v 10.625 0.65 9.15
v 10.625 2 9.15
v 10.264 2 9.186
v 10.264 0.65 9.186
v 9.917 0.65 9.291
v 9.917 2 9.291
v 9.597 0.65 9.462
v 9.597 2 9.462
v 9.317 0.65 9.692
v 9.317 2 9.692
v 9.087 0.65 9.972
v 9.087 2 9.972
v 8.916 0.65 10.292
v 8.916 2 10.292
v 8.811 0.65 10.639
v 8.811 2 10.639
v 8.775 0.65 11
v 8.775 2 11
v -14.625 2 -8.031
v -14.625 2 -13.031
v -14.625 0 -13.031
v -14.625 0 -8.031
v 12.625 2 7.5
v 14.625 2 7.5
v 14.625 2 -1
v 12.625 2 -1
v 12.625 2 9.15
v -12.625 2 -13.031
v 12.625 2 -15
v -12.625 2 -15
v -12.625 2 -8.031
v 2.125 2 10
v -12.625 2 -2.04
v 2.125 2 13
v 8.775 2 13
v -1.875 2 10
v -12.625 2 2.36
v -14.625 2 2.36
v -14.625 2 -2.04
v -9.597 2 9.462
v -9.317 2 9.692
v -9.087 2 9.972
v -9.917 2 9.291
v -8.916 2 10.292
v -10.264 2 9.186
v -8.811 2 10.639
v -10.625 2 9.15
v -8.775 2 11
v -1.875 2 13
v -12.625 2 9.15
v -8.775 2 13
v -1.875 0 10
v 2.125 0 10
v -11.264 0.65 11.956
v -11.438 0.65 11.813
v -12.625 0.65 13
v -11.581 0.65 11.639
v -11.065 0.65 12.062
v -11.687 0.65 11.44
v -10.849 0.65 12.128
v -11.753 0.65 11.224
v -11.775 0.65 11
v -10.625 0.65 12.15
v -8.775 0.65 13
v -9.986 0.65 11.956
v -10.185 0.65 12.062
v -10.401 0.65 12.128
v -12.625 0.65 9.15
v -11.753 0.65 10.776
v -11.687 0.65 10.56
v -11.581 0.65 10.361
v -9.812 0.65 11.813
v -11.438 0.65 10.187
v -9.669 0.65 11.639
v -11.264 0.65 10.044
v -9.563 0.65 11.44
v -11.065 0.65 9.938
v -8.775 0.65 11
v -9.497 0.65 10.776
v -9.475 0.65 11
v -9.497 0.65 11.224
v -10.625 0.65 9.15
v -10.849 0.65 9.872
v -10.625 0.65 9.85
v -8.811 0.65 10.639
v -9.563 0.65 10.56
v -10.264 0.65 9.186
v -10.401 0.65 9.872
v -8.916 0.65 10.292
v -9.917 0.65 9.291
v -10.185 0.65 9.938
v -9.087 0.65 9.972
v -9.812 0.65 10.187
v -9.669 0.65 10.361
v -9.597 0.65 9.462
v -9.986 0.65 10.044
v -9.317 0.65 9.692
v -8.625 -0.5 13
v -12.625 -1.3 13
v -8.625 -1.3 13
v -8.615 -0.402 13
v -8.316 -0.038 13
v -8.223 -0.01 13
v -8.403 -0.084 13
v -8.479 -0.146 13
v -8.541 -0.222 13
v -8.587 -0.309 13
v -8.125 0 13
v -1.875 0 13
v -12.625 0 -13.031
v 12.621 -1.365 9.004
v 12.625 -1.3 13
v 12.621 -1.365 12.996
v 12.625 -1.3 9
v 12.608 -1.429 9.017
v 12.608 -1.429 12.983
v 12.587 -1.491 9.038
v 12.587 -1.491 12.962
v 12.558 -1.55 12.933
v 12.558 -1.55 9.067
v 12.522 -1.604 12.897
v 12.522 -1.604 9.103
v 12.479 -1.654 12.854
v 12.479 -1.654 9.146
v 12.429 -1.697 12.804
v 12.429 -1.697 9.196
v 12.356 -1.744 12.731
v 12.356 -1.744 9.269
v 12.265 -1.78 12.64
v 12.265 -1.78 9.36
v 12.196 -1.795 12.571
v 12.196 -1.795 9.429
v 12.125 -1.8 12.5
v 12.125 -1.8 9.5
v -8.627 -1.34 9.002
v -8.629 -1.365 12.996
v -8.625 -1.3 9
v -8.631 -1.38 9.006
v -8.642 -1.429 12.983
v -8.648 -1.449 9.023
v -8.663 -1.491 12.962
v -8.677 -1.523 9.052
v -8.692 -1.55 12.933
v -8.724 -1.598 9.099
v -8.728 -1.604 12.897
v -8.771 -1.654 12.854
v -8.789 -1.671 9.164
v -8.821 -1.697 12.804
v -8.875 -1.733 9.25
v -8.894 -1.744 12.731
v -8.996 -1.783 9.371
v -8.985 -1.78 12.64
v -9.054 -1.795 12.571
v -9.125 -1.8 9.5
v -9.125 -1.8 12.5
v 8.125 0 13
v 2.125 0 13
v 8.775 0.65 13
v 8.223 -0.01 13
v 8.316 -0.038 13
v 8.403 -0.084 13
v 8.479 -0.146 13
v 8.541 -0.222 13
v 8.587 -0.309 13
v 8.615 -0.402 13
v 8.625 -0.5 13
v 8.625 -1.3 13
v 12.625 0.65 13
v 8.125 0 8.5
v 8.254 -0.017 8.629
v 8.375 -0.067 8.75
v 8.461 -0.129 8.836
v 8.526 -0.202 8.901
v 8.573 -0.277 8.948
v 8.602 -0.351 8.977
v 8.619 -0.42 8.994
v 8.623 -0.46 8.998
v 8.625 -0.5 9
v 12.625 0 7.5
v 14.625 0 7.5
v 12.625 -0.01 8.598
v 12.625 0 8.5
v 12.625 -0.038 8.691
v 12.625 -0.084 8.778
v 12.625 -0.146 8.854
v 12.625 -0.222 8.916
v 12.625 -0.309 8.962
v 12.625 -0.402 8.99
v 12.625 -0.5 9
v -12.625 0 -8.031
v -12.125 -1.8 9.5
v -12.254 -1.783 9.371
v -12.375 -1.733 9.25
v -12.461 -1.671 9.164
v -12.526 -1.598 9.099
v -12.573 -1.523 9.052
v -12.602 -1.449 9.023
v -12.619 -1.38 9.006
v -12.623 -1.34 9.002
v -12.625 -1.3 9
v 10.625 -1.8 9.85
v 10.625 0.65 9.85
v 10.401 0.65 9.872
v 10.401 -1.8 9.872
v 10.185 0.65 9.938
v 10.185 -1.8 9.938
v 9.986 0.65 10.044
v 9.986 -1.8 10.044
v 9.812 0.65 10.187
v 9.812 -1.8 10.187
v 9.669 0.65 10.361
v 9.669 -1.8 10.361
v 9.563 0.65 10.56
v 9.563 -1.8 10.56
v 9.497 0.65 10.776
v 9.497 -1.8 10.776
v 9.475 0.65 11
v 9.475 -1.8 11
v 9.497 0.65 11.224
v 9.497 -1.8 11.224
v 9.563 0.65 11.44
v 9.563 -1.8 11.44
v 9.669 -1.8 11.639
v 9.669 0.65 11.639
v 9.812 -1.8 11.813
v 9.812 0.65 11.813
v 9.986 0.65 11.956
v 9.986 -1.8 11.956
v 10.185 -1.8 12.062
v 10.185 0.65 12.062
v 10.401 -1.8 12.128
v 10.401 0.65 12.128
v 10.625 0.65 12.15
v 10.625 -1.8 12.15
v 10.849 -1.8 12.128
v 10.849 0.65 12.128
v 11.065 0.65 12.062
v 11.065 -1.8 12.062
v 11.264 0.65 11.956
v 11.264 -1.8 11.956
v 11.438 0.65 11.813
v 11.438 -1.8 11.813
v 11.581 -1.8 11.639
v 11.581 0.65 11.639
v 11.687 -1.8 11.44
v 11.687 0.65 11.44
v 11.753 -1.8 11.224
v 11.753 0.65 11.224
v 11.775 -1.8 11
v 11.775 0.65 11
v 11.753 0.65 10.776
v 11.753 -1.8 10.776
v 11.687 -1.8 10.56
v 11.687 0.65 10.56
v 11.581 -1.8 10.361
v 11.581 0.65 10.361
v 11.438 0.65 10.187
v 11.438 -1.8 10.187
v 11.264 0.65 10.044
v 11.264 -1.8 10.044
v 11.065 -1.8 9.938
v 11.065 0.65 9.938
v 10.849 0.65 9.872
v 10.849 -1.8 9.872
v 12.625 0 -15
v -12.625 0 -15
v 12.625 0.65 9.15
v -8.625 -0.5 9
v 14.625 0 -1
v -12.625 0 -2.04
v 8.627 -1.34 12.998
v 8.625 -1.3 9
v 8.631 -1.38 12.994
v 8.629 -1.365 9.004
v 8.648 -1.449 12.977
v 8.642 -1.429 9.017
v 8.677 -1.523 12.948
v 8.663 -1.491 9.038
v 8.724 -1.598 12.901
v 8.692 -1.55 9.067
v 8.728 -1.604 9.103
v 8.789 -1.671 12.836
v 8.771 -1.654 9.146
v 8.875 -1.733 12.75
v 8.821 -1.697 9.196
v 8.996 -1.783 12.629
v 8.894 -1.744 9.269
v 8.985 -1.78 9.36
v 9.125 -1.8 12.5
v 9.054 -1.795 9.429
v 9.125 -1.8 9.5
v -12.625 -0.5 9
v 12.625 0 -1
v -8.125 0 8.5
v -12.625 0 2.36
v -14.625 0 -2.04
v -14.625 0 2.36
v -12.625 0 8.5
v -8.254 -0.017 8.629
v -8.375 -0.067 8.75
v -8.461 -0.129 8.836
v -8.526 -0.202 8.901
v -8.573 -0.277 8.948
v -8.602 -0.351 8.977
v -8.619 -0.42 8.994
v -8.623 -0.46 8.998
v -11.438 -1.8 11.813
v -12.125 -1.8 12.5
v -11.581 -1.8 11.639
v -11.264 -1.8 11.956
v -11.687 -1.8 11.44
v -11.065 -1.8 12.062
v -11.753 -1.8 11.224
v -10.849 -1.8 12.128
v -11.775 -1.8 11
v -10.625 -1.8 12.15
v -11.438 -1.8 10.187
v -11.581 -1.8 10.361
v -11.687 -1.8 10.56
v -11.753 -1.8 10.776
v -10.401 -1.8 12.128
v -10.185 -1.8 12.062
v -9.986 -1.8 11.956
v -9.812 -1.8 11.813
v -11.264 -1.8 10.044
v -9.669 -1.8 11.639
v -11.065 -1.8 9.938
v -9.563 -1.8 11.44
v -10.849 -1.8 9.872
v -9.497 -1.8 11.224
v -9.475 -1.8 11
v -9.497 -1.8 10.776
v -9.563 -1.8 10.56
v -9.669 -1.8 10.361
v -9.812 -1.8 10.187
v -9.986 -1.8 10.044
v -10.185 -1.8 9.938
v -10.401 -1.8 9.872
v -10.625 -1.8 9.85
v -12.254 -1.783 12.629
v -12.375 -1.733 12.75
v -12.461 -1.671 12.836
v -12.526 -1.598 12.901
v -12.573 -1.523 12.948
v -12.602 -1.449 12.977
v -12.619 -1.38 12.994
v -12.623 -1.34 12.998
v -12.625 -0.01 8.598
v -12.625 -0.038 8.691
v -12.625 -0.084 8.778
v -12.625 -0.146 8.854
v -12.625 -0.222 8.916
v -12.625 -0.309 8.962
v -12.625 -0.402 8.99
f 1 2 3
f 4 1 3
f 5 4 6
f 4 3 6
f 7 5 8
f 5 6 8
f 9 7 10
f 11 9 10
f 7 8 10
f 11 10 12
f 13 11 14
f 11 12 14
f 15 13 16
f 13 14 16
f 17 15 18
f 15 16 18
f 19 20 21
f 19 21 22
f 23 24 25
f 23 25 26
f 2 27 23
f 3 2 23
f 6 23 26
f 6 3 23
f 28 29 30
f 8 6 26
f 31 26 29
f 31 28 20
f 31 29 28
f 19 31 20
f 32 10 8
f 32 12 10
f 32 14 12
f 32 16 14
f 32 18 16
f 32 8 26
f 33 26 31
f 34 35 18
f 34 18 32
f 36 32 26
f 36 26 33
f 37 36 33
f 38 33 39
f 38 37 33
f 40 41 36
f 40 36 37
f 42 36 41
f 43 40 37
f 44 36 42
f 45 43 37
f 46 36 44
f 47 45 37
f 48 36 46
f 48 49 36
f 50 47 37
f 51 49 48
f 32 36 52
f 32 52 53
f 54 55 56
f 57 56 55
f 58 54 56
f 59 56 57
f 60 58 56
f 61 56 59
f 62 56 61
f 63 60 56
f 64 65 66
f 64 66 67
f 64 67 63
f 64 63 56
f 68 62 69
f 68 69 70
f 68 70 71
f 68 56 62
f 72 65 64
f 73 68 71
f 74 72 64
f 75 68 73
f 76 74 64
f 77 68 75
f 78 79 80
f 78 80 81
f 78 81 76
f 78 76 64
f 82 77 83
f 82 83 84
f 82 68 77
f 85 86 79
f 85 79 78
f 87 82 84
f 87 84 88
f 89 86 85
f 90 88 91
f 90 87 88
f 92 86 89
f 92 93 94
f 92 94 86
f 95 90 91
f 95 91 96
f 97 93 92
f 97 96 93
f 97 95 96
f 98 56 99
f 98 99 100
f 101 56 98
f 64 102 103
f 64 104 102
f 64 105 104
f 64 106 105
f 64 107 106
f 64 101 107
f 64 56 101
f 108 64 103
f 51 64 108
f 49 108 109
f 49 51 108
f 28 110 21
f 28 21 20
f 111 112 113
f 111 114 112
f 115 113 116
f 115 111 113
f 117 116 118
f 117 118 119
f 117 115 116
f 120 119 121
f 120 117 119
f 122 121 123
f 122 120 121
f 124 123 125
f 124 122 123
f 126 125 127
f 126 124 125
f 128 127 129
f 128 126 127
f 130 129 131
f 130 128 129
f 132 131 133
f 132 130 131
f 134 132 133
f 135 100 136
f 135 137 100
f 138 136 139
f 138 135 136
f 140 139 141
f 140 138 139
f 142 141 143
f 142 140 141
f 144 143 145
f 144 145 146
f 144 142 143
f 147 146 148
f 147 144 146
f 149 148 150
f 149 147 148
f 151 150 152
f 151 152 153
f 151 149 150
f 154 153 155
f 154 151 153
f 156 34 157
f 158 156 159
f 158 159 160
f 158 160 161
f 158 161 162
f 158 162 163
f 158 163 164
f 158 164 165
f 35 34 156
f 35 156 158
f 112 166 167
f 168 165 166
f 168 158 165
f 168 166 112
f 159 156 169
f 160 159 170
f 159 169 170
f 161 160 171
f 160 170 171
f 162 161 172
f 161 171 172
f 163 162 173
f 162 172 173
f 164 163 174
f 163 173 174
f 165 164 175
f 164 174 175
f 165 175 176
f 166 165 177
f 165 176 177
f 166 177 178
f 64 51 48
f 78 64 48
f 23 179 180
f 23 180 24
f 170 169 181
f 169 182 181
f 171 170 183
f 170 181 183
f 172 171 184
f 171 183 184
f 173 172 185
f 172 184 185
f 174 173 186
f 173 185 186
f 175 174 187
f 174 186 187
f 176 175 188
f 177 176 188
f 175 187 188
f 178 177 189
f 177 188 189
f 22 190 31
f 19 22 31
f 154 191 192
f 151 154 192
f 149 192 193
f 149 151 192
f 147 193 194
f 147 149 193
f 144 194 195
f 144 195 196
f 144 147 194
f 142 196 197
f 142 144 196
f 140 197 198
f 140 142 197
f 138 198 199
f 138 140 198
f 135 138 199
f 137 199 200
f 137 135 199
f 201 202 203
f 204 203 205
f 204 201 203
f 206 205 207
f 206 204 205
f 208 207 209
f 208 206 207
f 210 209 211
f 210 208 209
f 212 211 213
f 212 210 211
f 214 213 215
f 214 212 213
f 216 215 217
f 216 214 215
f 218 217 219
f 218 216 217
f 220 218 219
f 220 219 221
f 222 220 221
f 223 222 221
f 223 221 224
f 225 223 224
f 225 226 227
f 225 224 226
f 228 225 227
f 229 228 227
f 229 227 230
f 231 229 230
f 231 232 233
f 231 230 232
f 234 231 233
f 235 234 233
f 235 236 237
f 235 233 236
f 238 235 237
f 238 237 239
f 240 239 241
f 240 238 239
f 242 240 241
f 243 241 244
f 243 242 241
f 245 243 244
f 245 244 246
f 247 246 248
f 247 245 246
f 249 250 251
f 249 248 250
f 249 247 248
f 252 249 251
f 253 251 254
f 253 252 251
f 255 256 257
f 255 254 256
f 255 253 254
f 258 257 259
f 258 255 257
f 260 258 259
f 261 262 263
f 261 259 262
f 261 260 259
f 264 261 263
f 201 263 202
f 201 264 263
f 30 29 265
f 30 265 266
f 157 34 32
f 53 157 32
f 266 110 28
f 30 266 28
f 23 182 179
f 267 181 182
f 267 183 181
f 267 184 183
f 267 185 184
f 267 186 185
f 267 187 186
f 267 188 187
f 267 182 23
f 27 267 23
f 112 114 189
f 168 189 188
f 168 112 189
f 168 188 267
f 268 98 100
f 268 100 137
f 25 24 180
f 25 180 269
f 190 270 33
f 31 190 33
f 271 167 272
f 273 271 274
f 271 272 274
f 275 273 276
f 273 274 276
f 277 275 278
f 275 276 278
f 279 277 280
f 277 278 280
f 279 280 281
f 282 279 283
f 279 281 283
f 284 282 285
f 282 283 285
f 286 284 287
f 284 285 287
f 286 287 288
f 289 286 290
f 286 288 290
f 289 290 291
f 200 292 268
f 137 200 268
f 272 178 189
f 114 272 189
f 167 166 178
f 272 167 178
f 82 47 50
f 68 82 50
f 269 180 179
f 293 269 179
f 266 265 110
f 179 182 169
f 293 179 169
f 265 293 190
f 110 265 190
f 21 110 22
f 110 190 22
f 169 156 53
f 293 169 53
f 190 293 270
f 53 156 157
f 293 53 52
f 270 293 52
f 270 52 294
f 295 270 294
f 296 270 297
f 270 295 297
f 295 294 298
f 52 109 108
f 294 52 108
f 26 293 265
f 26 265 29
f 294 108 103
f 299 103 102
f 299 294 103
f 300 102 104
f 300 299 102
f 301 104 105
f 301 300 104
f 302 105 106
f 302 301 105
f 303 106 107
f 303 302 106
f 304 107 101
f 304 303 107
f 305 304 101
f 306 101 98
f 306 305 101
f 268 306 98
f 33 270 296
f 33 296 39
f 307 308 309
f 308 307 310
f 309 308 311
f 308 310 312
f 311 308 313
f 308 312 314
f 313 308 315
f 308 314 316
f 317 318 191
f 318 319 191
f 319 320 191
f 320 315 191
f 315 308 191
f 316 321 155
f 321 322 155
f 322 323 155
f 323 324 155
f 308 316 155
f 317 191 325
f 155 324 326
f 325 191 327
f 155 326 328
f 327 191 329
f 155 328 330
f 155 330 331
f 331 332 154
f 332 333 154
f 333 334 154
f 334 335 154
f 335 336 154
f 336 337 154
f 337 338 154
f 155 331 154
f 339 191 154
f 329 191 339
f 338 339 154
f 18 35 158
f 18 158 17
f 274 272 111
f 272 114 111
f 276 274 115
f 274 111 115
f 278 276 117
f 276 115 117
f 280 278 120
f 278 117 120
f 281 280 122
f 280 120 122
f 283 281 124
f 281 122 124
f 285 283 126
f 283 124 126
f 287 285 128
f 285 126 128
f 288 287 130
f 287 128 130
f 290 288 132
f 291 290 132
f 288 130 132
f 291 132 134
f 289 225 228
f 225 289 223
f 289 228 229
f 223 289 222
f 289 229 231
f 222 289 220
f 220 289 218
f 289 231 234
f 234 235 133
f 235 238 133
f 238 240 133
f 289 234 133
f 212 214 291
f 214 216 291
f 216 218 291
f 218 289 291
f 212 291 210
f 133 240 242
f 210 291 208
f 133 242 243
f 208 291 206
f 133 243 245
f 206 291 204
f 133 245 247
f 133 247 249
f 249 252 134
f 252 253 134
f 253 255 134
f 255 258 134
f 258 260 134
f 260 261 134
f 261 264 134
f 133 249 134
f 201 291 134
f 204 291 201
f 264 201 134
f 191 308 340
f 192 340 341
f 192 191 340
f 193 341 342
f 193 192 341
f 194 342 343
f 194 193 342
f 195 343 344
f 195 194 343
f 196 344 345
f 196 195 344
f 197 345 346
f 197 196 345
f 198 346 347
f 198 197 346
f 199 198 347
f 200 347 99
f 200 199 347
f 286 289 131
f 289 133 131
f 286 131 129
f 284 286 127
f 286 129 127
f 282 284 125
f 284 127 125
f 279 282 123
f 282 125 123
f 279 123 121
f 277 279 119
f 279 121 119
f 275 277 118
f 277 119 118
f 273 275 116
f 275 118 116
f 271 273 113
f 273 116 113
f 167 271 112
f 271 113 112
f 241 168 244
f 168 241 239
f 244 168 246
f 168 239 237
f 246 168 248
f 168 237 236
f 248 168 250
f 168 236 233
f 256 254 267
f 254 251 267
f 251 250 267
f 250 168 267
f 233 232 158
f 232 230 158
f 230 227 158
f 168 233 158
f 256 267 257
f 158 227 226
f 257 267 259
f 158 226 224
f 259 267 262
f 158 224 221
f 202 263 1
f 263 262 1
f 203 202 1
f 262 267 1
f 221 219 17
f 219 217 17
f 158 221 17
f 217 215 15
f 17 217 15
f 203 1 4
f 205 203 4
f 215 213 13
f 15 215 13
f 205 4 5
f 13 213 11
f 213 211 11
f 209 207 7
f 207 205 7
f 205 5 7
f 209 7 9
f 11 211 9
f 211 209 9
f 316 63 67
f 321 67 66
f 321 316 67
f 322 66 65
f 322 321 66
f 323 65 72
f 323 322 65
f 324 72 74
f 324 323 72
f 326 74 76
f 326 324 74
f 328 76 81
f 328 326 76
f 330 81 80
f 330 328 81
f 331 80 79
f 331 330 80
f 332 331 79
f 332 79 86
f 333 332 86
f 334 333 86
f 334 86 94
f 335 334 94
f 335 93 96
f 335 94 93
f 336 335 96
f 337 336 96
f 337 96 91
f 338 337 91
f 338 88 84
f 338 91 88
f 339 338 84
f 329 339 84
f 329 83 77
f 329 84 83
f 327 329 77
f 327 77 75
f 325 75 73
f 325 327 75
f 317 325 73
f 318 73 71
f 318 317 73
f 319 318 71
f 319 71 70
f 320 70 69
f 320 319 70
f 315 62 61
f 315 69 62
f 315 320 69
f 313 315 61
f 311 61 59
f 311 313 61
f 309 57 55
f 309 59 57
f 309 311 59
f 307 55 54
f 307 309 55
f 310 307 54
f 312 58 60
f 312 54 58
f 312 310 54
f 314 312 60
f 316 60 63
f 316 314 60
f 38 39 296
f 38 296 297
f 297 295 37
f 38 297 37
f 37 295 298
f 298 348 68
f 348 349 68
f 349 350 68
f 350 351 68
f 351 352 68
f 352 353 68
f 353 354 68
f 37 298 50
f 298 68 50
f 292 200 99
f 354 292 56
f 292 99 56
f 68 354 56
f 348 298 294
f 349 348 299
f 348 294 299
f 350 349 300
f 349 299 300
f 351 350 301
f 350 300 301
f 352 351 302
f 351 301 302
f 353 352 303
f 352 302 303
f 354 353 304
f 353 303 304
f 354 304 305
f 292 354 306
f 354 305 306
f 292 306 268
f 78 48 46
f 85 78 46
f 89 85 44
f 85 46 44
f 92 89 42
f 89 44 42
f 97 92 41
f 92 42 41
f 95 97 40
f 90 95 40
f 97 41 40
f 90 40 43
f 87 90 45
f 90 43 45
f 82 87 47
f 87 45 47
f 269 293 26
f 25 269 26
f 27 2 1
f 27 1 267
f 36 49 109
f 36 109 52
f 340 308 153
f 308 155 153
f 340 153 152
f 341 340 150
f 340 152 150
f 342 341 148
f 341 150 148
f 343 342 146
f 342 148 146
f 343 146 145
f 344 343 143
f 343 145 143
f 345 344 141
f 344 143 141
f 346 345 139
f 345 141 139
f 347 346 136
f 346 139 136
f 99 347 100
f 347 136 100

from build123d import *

# Parameters (mm, degrees)
SKETCH_1_W               = 25.25
SKETCH_1_H               = 26
EXTRUDE_1_DEPTH          = 2
SKETCH_3_W               = 4
SKETCH_3_H               = 4
EXTRUDE_2_DEPTH          = 1.8
CUT_EXTRUDE_2_DEPTH      = 2
CUT_EXTRUDE_2_DEPTH_BACK = 1.8
SKETCH_4_R               = 1.15
SKETCH_5_R               = 1.85
CUT_EXTRUDE_3_DEPTH      = 1.35
SKETCH_7_W               = 25.25
SKETCH_7_H               = 2
EXTRUDE_4_DEPTH          = 2
FILLET_3_R               = 0.5
SKETCH_8_W               = 8.5
SKETCH_8_H               = 2
EXTRUDE_5_DEPTH          = 2
SKETCH_9_W               = 5
SKETCH_9_H               = 2
EXTRUDE_6_DEPTH          = 2
SKETCH_10_W              = 4.4
SKETCH_10_H              = 2
EXTRUDE_7_DEPTH          = 2
SKETCH_11_W              = 4
SKETCH_11_H              = 3
CUT_EXTRUDE_4_DEPTH      = 2
CUT_EXTRUDE_5_DEPTH      = 1.35


with BuildPart() as part:
    # 草图1 → 凸台-拉伸1 (new body)
    with BuildSketch(Plane(origin=(0, 0, 0), x_dir=(1, 0, 0), z_dir=(0, 1, 0))):
        Rectangle(SKETCH_1_W, SKETCH_1_H)
    extrude(amount=EXTRUDE_1_DEPTH)

    # 草图3 → 凸台-拉伸2 (add)
    with BuildSketch(Plane(origin=(0, 0, 0), x_dir=(1, 0, 0), z_dir=(0, 1, 0))):
        with Locations((-10.625, -11)):
            Rectangle(SKETCH_3_W, SKETCH_3_H)
        with Locations((10.625, -11)):
            Rectangle(SKETCH_3_W, SKETCH_3_H)
    extrude(amount=-EXTRUDE_2_DEPTH)

    # 草图4 → 切除-拉伸2 (cut, two sides: drawn at the far end of the back side and taken through both)
    with BuildSketch(Plane(origin=(0, 0, 0), x_dir=(1, 0, 0), z_dir=(0, 1, 0)).offset(-CUT_EXTRUDE_2_DEPTH_BACK)):
        with Locations(Location((-10.625, -11, 0), (0, 0, 270))):
            Circle(SKETCH_4_R)
        with Locations(Location((10.625, -11, 0), (0, 0, 90))):
            Circle(SKETCH_4_R)
    extrude(amount=CUT_EXTRUDE_2_DEPTH + CUT_EXTRUDE_2_DEPTH_BACK, mode=Mode.SUBTRACT)

    # 草图5 → 切除-拉伸3 (cut)
    with BuildSketch(Plane(origin=(0, 2, 0), x_dir=(1, 0, 0), z_dir=(0, 1, 0))):
        with Locations(Location((-10.625, -11, 0), (0, 0, 270))):
            Circle(SKETCH_5_R)
        with Locations(Location((10.625, -11, 0), (0, 0, 270))):
            Circle(SKETCH_5_R)
    extrude(amount=-CUT_EXTRUDE_3_DEPTH, mode=Mode.SUBTRACT)

    # 草图7 → 凸台-拉伸4 (add)
    with BuildSketch(Plane(origin=(0, 0, -13), x_dir=(-1, 0, 0), z_dir=(0, 0, -1))):
        with Locations((0, 1)):
            Rectangle(SKETCH_7_W, SKETCH_7_H)
    extrude(amount=EXTRUDE_4_DEPTH)

    # 圆角3
    fillet_3_edges = [part.edges().sort_by_distance(p)[0] for p in [
        (-12.625, -1.8, 11),
        (-10.625, -1.8, 9),
        (-8.625, -1.8, 11),
        (-10.625, -1.8, 13),
        (-8.625, 0, 11),
        (-10.625, 0, 9),
        (12.625, -1.8, 11),
        (10.625, -1.8, 13),
        (8.625, -1.8, 11),
        (10.625, -1.8, 9),
        (10.625, 0, 9),
        (8.625, 0, 11),
    ]]
    fillet(fillet_3_edges, radius=FILLET_3_R)

    # 草图8 → 凸台-拉伸5 (add)
    with BuildSketch(Plane(origin=(12.625, 0, 0), x_dir=(0, 0, -1), z_dir=(1, 0, 0))):
        with Locations((-3.25, 1)):
            Rectangle(SKETCH_8_W, SKETCH_8_H)
    extrude(amount=EXTRUDE_5_DEPTH)

    # 草图9 → 凸台-拉伸6 (add)
    with BuildSketch(Plane.ZY.offset(12.625)):
        with Locations((-10.530736821, 1)):
            Rectangle(SKETCH_9_W, SKETCH_9_H)
    extrude(amount=EXTRUDE_6_DEPTH)

    # 草图10 → 凸台-拉伸7 (add)
    with BuildSketch(Plane.ZY.offset(12.625)):
        with Locations((0.16, 1)):
            Rectangle(SKETCH_10_W, SKETCH_10_H)
    extrude(amount=EXTRUDE_7_DEPTH)

    # 草图11 → 切除-拉伸4 (cut)
    with BuildSketch(Plane(origin=(0, 2, 0), x_dir=(1, 0, 0), z_dir=(0, 1, 0))):
        with Locations((0.125, -11.5)):
            Rectangle(SKETCH_11_W, SKETCH_11_H)
    extrude(amount=-CUT_EXTRUDE_4_DEPTH, mode=Mode.SUBTRACT)

    # 草图12 → 切除-拉伸5 (cut)
    with BuildSketch(Plane(origin=(0, 2, 0), x_dir=(1, 0, 0), z_dir=(0, 1, 0))):
        Polygon((-10.625, -9.15), (-12.625, -9.15), (-12.625, -13), (-8.775, -13), (-8.775, -11), align=None)
        Polygon((8.775, -11), (10.625, -9.15), (12.625, -9.15), (12.625, -13), (8.775, -13), align=None)
    extrude(amount=-CUT_EXTRUDE_5_DEPTH, mode=Mode.SUBTRACT)


solid = part.part
